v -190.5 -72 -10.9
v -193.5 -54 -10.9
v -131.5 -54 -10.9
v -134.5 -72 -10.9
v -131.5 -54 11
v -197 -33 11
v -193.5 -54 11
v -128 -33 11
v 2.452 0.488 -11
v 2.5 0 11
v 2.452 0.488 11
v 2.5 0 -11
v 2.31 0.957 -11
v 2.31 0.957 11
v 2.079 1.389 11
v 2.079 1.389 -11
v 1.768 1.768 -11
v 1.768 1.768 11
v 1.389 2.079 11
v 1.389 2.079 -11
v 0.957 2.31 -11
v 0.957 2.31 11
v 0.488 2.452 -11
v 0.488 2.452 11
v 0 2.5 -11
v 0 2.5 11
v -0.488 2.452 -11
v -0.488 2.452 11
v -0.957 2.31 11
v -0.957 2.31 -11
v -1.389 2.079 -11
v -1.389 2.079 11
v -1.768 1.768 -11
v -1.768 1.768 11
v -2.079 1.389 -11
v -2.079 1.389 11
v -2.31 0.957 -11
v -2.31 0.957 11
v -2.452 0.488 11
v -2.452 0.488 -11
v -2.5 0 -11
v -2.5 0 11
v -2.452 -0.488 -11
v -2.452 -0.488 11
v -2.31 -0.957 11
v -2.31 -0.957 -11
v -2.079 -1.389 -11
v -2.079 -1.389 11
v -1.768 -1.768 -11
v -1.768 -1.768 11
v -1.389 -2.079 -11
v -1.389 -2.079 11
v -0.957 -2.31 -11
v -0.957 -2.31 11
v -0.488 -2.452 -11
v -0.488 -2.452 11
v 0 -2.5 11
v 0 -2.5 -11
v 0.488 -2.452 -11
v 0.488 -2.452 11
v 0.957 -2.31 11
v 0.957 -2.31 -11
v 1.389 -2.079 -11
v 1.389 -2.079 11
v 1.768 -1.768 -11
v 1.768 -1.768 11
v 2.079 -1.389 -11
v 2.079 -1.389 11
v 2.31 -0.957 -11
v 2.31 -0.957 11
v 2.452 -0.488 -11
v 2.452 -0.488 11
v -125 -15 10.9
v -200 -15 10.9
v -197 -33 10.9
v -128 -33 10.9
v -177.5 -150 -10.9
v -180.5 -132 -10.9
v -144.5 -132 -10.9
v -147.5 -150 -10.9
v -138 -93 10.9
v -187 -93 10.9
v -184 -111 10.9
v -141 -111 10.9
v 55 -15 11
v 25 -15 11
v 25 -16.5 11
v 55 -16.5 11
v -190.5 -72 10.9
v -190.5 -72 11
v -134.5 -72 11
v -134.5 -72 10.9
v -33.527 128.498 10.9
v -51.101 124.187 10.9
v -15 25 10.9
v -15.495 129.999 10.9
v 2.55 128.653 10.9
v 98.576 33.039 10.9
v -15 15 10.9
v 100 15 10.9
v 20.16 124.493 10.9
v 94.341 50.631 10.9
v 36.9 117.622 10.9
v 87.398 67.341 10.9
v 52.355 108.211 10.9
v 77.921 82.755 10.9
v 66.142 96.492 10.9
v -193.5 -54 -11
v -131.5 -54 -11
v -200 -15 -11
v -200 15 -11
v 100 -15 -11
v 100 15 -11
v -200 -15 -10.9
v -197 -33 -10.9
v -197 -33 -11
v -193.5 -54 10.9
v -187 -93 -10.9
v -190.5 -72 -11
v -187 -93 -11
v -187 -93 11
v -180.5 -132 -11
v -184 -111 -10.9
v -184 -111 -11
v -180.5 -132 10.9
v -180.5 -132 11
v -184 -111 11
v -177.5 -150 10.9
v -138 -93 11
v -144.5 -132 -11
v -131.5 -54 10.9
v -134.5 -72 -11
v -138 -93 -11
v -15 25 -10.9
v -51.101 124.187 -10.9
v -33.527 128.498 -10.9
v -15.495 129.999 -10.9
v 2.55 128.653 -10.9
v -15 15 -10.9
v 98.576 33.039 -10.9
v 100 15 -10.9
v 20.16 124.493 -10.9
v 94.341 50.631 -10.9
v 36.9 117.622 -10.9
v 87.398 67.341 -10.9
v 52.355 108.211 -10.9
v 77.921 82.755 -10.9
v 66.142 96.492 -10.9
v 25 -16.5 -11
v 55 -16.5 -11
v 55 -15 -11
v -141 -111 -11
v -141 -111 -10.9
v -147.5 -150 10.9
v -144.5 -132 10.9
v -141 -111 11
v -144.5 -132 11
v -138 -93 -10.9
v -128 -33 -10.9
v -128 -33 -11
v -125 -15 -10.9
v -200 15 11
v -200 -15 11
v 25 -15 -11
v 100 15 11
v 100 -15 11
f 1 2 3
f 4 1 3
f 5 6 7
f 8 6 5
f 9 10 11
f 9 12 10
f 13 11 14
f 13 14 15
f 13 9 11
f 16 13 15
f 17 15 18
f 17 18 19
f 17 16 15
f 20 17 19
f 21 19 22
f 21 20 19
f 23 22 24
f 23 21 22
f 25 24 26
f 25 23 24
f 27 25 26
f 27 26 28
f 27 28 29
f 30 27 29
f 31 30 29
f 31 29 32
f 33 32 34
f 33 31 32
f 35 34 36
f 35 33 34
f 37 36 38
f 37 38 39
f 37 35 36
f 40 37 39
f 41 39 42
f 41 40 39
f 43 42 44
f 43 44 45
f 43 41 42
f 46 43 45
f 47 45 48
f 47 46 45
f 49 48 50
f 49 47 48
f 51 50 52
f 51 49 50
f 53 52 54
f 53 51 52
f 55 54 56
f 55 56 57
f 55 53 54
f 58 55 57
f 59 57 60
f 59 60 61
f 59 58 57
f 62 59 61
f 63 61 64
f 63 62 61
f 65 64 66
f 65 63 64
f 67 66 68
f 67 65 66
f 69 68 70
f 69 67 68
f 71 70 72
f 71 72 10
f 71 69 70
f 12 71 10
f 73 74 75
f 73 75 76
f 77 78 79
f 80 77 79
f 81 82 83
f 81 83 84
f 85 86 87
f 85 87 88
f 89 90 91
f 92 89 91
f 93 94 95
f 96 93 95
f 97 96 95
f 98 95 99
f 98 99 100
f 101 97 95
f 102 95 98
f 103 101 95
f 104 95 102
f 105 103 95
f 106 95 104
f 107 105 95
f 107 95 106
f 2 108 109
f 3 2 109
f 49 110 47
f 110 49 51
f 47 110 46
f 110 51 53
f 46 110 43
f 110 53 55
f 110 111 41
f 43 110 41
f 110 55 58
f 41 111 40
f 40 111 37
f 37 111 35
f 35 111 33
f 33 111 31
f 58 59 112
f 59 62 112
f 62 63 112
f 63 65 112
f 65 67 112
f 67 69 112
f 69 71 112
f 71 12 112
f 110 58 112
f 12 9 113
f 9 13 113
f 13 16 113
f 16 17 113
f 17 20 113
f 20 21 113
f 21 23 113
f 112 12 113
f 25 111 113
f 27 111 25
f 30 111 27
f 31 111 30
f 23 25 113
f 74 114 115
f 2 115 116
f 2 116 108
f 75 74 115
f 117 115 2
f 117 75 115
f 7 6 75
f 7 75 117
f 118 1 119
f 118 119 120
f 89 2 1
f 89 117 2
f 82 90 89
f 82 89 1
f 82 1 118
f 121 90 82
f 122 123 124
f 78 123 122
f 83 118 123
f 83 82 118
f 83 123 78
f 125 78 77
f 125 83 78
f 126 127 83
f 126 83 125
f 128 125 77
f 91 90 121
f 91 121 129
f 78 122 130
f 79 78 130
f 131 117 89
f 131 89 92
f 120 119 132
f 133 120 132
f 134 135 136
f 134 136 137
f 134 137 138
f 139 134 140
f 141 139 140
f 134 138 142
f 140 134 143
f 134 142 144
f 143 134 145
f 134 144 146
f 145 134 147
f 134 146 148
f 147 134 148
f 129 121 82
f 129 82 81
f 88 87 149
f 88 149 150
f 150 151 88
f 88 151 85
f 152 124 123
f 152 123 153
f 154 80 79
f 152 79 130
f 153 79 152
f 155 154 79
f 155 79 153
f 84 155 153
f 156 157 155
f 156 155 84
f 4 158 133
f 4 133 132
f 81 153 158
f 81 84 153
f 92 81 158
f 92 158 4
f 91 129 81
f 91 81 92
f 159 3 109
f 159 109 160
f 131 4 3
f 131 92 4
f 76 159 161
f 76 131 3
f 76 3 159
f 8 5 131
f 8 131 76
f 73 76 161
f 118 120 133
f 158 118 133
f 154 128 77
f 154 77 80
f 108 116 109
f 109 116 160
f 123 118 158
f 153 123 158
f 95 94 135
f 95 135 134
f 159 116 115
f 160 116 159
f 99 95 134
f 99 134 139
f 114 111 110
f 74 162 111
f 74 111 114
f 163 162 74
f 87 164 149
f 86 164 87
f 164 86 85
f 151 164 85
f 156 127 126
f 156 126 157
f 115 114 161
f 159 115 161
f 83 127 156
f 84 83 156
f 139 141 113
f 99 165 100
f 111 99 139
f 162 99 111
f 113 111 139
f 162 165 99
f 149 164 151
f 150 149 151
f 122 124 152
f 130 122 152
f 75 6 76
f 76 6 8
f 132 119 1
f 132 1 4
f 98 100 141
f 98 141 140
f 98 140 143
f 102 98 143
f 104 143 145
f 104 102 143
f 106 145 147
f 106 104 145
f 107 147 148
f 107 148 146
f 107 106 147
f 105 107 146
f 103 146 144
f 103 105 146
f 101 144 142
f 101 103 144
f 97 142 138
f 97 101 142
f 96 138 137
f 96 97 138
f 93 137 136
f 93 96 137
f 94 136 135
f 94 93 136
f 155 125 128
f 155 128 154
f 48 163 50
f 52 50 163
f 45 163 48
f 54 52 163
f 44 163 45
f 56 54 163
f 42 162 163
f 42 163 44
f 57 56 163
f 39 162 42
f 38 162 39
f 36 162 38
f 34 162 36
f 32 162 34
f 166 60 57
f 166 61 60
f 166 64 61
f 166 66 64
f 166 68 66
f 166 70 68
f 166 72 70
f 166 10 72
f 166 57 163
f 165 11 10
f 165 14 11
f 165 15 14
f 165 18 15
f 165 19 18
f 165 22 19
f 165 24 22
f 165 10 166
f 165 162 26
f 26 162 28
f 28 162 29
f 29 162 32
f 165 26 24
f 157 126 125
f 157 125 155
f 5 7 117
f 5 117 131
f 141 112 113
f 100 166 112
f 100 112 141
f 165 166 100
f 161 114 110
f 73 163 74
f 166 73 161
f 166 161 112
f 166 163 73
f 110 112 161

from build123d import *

# Parameters (mm, degrees)
ESQUISSE1_R             = 2.5
BOSS_EXTRU_1_DEPTH      = 11
ESQUISSE2_W             = 151.100979474
ESQUISSE2_H             = 151.100979474
ESQUISSE2_W_2           = 75
ESQUISSE2_H_2           = 18
ENL_V_MAT_EXTRU_1_DEPTH = 0.1
ESQUISSE3_W             = 30
ESQUISSE3_H             = 22
BOSS_EXTRU_2_DEPTH      = 1.5


with BuildPart() as part:
    # Esquisse1 → Boss.-Extru.1 (new, symmetric)
    with BuildSketch(Plane.XY):
        with BuildLine():
            Line((-125, -15), (100, -15))
            Line((100, -15), (100, 15))
            ThreePointArc((100, 15), (52.354982594, 108.211084747), (-51.100979474, 124.186625926))
            Line((-51.100979474, 124.186625926), (-15, 25))
            Line((-15, 25), (-15, 15))
            Line((-15, 15), (-200, 15))
            Line((-200, 15), (-200, -15))
            Line((-200, -15), (-177.5, -150))
            Line((-177.5, -150), (-147.5, -150))
            Line((-147.5, -150), (-125, -15))
        make_face()
        Circle(ESQUISSE1_R, mode=Mode.SUBTRACT)
    extrude(amount=BOSS_EXTRU_1_DEPTH, both=True)

    # Esquisse2 → Enlèv. mat.-Extru.1 (cut)
    with BuildSketch(Plane.XY.offset(11)):
        with Locations((24.449510263, 90.550489737)):
            Rectangle(ESQUISSE2_W, ESQUISSE2_H)
        with Locations((-162.5, -24)):
            Rectangle(ESQUISSE2_W_2, ESQUISSE2_H_2)
        with Locations((-162.5, -63)):
            Rectangle(ESQUISSE2_W_2, ESQUISSE2_H_2)
        with Locations((-162.5, -102)):
            Rectangle(ESQUISSE2_W_2, ESQUISSE2_H_2)
        with Locations((-162.5, -141)):
            Rectangle(ESQUISSE2_W_2, ESQUISSE2_H_2)
    enl_v_mat_extru_1 = extrude(amount=-ENL_V_MAT_EXTRU_1_DEPTH, mode=Mode.SUBTRACT)

    # Symétrie1: Enlèv. mat.-Extru.1 across plane
    add(enl_v_mat_extru_1.mirror(Plane.XY), mode=Mode.SUBTRACT)


with BuildPart() as body_2:
    # Esquisse3 → Boss.-Extru.2 (new body)
    with BuildSketch(Plane.XZ.offset(15)):
        with Locations((40, 0)):
            Rectangle(ESQUISSE3_W, ESQUISSE3_H)
    extrude(amount=BOSS_EXTRU_2_DEPTH)


solid = Compound([part.part, body_2.part])
